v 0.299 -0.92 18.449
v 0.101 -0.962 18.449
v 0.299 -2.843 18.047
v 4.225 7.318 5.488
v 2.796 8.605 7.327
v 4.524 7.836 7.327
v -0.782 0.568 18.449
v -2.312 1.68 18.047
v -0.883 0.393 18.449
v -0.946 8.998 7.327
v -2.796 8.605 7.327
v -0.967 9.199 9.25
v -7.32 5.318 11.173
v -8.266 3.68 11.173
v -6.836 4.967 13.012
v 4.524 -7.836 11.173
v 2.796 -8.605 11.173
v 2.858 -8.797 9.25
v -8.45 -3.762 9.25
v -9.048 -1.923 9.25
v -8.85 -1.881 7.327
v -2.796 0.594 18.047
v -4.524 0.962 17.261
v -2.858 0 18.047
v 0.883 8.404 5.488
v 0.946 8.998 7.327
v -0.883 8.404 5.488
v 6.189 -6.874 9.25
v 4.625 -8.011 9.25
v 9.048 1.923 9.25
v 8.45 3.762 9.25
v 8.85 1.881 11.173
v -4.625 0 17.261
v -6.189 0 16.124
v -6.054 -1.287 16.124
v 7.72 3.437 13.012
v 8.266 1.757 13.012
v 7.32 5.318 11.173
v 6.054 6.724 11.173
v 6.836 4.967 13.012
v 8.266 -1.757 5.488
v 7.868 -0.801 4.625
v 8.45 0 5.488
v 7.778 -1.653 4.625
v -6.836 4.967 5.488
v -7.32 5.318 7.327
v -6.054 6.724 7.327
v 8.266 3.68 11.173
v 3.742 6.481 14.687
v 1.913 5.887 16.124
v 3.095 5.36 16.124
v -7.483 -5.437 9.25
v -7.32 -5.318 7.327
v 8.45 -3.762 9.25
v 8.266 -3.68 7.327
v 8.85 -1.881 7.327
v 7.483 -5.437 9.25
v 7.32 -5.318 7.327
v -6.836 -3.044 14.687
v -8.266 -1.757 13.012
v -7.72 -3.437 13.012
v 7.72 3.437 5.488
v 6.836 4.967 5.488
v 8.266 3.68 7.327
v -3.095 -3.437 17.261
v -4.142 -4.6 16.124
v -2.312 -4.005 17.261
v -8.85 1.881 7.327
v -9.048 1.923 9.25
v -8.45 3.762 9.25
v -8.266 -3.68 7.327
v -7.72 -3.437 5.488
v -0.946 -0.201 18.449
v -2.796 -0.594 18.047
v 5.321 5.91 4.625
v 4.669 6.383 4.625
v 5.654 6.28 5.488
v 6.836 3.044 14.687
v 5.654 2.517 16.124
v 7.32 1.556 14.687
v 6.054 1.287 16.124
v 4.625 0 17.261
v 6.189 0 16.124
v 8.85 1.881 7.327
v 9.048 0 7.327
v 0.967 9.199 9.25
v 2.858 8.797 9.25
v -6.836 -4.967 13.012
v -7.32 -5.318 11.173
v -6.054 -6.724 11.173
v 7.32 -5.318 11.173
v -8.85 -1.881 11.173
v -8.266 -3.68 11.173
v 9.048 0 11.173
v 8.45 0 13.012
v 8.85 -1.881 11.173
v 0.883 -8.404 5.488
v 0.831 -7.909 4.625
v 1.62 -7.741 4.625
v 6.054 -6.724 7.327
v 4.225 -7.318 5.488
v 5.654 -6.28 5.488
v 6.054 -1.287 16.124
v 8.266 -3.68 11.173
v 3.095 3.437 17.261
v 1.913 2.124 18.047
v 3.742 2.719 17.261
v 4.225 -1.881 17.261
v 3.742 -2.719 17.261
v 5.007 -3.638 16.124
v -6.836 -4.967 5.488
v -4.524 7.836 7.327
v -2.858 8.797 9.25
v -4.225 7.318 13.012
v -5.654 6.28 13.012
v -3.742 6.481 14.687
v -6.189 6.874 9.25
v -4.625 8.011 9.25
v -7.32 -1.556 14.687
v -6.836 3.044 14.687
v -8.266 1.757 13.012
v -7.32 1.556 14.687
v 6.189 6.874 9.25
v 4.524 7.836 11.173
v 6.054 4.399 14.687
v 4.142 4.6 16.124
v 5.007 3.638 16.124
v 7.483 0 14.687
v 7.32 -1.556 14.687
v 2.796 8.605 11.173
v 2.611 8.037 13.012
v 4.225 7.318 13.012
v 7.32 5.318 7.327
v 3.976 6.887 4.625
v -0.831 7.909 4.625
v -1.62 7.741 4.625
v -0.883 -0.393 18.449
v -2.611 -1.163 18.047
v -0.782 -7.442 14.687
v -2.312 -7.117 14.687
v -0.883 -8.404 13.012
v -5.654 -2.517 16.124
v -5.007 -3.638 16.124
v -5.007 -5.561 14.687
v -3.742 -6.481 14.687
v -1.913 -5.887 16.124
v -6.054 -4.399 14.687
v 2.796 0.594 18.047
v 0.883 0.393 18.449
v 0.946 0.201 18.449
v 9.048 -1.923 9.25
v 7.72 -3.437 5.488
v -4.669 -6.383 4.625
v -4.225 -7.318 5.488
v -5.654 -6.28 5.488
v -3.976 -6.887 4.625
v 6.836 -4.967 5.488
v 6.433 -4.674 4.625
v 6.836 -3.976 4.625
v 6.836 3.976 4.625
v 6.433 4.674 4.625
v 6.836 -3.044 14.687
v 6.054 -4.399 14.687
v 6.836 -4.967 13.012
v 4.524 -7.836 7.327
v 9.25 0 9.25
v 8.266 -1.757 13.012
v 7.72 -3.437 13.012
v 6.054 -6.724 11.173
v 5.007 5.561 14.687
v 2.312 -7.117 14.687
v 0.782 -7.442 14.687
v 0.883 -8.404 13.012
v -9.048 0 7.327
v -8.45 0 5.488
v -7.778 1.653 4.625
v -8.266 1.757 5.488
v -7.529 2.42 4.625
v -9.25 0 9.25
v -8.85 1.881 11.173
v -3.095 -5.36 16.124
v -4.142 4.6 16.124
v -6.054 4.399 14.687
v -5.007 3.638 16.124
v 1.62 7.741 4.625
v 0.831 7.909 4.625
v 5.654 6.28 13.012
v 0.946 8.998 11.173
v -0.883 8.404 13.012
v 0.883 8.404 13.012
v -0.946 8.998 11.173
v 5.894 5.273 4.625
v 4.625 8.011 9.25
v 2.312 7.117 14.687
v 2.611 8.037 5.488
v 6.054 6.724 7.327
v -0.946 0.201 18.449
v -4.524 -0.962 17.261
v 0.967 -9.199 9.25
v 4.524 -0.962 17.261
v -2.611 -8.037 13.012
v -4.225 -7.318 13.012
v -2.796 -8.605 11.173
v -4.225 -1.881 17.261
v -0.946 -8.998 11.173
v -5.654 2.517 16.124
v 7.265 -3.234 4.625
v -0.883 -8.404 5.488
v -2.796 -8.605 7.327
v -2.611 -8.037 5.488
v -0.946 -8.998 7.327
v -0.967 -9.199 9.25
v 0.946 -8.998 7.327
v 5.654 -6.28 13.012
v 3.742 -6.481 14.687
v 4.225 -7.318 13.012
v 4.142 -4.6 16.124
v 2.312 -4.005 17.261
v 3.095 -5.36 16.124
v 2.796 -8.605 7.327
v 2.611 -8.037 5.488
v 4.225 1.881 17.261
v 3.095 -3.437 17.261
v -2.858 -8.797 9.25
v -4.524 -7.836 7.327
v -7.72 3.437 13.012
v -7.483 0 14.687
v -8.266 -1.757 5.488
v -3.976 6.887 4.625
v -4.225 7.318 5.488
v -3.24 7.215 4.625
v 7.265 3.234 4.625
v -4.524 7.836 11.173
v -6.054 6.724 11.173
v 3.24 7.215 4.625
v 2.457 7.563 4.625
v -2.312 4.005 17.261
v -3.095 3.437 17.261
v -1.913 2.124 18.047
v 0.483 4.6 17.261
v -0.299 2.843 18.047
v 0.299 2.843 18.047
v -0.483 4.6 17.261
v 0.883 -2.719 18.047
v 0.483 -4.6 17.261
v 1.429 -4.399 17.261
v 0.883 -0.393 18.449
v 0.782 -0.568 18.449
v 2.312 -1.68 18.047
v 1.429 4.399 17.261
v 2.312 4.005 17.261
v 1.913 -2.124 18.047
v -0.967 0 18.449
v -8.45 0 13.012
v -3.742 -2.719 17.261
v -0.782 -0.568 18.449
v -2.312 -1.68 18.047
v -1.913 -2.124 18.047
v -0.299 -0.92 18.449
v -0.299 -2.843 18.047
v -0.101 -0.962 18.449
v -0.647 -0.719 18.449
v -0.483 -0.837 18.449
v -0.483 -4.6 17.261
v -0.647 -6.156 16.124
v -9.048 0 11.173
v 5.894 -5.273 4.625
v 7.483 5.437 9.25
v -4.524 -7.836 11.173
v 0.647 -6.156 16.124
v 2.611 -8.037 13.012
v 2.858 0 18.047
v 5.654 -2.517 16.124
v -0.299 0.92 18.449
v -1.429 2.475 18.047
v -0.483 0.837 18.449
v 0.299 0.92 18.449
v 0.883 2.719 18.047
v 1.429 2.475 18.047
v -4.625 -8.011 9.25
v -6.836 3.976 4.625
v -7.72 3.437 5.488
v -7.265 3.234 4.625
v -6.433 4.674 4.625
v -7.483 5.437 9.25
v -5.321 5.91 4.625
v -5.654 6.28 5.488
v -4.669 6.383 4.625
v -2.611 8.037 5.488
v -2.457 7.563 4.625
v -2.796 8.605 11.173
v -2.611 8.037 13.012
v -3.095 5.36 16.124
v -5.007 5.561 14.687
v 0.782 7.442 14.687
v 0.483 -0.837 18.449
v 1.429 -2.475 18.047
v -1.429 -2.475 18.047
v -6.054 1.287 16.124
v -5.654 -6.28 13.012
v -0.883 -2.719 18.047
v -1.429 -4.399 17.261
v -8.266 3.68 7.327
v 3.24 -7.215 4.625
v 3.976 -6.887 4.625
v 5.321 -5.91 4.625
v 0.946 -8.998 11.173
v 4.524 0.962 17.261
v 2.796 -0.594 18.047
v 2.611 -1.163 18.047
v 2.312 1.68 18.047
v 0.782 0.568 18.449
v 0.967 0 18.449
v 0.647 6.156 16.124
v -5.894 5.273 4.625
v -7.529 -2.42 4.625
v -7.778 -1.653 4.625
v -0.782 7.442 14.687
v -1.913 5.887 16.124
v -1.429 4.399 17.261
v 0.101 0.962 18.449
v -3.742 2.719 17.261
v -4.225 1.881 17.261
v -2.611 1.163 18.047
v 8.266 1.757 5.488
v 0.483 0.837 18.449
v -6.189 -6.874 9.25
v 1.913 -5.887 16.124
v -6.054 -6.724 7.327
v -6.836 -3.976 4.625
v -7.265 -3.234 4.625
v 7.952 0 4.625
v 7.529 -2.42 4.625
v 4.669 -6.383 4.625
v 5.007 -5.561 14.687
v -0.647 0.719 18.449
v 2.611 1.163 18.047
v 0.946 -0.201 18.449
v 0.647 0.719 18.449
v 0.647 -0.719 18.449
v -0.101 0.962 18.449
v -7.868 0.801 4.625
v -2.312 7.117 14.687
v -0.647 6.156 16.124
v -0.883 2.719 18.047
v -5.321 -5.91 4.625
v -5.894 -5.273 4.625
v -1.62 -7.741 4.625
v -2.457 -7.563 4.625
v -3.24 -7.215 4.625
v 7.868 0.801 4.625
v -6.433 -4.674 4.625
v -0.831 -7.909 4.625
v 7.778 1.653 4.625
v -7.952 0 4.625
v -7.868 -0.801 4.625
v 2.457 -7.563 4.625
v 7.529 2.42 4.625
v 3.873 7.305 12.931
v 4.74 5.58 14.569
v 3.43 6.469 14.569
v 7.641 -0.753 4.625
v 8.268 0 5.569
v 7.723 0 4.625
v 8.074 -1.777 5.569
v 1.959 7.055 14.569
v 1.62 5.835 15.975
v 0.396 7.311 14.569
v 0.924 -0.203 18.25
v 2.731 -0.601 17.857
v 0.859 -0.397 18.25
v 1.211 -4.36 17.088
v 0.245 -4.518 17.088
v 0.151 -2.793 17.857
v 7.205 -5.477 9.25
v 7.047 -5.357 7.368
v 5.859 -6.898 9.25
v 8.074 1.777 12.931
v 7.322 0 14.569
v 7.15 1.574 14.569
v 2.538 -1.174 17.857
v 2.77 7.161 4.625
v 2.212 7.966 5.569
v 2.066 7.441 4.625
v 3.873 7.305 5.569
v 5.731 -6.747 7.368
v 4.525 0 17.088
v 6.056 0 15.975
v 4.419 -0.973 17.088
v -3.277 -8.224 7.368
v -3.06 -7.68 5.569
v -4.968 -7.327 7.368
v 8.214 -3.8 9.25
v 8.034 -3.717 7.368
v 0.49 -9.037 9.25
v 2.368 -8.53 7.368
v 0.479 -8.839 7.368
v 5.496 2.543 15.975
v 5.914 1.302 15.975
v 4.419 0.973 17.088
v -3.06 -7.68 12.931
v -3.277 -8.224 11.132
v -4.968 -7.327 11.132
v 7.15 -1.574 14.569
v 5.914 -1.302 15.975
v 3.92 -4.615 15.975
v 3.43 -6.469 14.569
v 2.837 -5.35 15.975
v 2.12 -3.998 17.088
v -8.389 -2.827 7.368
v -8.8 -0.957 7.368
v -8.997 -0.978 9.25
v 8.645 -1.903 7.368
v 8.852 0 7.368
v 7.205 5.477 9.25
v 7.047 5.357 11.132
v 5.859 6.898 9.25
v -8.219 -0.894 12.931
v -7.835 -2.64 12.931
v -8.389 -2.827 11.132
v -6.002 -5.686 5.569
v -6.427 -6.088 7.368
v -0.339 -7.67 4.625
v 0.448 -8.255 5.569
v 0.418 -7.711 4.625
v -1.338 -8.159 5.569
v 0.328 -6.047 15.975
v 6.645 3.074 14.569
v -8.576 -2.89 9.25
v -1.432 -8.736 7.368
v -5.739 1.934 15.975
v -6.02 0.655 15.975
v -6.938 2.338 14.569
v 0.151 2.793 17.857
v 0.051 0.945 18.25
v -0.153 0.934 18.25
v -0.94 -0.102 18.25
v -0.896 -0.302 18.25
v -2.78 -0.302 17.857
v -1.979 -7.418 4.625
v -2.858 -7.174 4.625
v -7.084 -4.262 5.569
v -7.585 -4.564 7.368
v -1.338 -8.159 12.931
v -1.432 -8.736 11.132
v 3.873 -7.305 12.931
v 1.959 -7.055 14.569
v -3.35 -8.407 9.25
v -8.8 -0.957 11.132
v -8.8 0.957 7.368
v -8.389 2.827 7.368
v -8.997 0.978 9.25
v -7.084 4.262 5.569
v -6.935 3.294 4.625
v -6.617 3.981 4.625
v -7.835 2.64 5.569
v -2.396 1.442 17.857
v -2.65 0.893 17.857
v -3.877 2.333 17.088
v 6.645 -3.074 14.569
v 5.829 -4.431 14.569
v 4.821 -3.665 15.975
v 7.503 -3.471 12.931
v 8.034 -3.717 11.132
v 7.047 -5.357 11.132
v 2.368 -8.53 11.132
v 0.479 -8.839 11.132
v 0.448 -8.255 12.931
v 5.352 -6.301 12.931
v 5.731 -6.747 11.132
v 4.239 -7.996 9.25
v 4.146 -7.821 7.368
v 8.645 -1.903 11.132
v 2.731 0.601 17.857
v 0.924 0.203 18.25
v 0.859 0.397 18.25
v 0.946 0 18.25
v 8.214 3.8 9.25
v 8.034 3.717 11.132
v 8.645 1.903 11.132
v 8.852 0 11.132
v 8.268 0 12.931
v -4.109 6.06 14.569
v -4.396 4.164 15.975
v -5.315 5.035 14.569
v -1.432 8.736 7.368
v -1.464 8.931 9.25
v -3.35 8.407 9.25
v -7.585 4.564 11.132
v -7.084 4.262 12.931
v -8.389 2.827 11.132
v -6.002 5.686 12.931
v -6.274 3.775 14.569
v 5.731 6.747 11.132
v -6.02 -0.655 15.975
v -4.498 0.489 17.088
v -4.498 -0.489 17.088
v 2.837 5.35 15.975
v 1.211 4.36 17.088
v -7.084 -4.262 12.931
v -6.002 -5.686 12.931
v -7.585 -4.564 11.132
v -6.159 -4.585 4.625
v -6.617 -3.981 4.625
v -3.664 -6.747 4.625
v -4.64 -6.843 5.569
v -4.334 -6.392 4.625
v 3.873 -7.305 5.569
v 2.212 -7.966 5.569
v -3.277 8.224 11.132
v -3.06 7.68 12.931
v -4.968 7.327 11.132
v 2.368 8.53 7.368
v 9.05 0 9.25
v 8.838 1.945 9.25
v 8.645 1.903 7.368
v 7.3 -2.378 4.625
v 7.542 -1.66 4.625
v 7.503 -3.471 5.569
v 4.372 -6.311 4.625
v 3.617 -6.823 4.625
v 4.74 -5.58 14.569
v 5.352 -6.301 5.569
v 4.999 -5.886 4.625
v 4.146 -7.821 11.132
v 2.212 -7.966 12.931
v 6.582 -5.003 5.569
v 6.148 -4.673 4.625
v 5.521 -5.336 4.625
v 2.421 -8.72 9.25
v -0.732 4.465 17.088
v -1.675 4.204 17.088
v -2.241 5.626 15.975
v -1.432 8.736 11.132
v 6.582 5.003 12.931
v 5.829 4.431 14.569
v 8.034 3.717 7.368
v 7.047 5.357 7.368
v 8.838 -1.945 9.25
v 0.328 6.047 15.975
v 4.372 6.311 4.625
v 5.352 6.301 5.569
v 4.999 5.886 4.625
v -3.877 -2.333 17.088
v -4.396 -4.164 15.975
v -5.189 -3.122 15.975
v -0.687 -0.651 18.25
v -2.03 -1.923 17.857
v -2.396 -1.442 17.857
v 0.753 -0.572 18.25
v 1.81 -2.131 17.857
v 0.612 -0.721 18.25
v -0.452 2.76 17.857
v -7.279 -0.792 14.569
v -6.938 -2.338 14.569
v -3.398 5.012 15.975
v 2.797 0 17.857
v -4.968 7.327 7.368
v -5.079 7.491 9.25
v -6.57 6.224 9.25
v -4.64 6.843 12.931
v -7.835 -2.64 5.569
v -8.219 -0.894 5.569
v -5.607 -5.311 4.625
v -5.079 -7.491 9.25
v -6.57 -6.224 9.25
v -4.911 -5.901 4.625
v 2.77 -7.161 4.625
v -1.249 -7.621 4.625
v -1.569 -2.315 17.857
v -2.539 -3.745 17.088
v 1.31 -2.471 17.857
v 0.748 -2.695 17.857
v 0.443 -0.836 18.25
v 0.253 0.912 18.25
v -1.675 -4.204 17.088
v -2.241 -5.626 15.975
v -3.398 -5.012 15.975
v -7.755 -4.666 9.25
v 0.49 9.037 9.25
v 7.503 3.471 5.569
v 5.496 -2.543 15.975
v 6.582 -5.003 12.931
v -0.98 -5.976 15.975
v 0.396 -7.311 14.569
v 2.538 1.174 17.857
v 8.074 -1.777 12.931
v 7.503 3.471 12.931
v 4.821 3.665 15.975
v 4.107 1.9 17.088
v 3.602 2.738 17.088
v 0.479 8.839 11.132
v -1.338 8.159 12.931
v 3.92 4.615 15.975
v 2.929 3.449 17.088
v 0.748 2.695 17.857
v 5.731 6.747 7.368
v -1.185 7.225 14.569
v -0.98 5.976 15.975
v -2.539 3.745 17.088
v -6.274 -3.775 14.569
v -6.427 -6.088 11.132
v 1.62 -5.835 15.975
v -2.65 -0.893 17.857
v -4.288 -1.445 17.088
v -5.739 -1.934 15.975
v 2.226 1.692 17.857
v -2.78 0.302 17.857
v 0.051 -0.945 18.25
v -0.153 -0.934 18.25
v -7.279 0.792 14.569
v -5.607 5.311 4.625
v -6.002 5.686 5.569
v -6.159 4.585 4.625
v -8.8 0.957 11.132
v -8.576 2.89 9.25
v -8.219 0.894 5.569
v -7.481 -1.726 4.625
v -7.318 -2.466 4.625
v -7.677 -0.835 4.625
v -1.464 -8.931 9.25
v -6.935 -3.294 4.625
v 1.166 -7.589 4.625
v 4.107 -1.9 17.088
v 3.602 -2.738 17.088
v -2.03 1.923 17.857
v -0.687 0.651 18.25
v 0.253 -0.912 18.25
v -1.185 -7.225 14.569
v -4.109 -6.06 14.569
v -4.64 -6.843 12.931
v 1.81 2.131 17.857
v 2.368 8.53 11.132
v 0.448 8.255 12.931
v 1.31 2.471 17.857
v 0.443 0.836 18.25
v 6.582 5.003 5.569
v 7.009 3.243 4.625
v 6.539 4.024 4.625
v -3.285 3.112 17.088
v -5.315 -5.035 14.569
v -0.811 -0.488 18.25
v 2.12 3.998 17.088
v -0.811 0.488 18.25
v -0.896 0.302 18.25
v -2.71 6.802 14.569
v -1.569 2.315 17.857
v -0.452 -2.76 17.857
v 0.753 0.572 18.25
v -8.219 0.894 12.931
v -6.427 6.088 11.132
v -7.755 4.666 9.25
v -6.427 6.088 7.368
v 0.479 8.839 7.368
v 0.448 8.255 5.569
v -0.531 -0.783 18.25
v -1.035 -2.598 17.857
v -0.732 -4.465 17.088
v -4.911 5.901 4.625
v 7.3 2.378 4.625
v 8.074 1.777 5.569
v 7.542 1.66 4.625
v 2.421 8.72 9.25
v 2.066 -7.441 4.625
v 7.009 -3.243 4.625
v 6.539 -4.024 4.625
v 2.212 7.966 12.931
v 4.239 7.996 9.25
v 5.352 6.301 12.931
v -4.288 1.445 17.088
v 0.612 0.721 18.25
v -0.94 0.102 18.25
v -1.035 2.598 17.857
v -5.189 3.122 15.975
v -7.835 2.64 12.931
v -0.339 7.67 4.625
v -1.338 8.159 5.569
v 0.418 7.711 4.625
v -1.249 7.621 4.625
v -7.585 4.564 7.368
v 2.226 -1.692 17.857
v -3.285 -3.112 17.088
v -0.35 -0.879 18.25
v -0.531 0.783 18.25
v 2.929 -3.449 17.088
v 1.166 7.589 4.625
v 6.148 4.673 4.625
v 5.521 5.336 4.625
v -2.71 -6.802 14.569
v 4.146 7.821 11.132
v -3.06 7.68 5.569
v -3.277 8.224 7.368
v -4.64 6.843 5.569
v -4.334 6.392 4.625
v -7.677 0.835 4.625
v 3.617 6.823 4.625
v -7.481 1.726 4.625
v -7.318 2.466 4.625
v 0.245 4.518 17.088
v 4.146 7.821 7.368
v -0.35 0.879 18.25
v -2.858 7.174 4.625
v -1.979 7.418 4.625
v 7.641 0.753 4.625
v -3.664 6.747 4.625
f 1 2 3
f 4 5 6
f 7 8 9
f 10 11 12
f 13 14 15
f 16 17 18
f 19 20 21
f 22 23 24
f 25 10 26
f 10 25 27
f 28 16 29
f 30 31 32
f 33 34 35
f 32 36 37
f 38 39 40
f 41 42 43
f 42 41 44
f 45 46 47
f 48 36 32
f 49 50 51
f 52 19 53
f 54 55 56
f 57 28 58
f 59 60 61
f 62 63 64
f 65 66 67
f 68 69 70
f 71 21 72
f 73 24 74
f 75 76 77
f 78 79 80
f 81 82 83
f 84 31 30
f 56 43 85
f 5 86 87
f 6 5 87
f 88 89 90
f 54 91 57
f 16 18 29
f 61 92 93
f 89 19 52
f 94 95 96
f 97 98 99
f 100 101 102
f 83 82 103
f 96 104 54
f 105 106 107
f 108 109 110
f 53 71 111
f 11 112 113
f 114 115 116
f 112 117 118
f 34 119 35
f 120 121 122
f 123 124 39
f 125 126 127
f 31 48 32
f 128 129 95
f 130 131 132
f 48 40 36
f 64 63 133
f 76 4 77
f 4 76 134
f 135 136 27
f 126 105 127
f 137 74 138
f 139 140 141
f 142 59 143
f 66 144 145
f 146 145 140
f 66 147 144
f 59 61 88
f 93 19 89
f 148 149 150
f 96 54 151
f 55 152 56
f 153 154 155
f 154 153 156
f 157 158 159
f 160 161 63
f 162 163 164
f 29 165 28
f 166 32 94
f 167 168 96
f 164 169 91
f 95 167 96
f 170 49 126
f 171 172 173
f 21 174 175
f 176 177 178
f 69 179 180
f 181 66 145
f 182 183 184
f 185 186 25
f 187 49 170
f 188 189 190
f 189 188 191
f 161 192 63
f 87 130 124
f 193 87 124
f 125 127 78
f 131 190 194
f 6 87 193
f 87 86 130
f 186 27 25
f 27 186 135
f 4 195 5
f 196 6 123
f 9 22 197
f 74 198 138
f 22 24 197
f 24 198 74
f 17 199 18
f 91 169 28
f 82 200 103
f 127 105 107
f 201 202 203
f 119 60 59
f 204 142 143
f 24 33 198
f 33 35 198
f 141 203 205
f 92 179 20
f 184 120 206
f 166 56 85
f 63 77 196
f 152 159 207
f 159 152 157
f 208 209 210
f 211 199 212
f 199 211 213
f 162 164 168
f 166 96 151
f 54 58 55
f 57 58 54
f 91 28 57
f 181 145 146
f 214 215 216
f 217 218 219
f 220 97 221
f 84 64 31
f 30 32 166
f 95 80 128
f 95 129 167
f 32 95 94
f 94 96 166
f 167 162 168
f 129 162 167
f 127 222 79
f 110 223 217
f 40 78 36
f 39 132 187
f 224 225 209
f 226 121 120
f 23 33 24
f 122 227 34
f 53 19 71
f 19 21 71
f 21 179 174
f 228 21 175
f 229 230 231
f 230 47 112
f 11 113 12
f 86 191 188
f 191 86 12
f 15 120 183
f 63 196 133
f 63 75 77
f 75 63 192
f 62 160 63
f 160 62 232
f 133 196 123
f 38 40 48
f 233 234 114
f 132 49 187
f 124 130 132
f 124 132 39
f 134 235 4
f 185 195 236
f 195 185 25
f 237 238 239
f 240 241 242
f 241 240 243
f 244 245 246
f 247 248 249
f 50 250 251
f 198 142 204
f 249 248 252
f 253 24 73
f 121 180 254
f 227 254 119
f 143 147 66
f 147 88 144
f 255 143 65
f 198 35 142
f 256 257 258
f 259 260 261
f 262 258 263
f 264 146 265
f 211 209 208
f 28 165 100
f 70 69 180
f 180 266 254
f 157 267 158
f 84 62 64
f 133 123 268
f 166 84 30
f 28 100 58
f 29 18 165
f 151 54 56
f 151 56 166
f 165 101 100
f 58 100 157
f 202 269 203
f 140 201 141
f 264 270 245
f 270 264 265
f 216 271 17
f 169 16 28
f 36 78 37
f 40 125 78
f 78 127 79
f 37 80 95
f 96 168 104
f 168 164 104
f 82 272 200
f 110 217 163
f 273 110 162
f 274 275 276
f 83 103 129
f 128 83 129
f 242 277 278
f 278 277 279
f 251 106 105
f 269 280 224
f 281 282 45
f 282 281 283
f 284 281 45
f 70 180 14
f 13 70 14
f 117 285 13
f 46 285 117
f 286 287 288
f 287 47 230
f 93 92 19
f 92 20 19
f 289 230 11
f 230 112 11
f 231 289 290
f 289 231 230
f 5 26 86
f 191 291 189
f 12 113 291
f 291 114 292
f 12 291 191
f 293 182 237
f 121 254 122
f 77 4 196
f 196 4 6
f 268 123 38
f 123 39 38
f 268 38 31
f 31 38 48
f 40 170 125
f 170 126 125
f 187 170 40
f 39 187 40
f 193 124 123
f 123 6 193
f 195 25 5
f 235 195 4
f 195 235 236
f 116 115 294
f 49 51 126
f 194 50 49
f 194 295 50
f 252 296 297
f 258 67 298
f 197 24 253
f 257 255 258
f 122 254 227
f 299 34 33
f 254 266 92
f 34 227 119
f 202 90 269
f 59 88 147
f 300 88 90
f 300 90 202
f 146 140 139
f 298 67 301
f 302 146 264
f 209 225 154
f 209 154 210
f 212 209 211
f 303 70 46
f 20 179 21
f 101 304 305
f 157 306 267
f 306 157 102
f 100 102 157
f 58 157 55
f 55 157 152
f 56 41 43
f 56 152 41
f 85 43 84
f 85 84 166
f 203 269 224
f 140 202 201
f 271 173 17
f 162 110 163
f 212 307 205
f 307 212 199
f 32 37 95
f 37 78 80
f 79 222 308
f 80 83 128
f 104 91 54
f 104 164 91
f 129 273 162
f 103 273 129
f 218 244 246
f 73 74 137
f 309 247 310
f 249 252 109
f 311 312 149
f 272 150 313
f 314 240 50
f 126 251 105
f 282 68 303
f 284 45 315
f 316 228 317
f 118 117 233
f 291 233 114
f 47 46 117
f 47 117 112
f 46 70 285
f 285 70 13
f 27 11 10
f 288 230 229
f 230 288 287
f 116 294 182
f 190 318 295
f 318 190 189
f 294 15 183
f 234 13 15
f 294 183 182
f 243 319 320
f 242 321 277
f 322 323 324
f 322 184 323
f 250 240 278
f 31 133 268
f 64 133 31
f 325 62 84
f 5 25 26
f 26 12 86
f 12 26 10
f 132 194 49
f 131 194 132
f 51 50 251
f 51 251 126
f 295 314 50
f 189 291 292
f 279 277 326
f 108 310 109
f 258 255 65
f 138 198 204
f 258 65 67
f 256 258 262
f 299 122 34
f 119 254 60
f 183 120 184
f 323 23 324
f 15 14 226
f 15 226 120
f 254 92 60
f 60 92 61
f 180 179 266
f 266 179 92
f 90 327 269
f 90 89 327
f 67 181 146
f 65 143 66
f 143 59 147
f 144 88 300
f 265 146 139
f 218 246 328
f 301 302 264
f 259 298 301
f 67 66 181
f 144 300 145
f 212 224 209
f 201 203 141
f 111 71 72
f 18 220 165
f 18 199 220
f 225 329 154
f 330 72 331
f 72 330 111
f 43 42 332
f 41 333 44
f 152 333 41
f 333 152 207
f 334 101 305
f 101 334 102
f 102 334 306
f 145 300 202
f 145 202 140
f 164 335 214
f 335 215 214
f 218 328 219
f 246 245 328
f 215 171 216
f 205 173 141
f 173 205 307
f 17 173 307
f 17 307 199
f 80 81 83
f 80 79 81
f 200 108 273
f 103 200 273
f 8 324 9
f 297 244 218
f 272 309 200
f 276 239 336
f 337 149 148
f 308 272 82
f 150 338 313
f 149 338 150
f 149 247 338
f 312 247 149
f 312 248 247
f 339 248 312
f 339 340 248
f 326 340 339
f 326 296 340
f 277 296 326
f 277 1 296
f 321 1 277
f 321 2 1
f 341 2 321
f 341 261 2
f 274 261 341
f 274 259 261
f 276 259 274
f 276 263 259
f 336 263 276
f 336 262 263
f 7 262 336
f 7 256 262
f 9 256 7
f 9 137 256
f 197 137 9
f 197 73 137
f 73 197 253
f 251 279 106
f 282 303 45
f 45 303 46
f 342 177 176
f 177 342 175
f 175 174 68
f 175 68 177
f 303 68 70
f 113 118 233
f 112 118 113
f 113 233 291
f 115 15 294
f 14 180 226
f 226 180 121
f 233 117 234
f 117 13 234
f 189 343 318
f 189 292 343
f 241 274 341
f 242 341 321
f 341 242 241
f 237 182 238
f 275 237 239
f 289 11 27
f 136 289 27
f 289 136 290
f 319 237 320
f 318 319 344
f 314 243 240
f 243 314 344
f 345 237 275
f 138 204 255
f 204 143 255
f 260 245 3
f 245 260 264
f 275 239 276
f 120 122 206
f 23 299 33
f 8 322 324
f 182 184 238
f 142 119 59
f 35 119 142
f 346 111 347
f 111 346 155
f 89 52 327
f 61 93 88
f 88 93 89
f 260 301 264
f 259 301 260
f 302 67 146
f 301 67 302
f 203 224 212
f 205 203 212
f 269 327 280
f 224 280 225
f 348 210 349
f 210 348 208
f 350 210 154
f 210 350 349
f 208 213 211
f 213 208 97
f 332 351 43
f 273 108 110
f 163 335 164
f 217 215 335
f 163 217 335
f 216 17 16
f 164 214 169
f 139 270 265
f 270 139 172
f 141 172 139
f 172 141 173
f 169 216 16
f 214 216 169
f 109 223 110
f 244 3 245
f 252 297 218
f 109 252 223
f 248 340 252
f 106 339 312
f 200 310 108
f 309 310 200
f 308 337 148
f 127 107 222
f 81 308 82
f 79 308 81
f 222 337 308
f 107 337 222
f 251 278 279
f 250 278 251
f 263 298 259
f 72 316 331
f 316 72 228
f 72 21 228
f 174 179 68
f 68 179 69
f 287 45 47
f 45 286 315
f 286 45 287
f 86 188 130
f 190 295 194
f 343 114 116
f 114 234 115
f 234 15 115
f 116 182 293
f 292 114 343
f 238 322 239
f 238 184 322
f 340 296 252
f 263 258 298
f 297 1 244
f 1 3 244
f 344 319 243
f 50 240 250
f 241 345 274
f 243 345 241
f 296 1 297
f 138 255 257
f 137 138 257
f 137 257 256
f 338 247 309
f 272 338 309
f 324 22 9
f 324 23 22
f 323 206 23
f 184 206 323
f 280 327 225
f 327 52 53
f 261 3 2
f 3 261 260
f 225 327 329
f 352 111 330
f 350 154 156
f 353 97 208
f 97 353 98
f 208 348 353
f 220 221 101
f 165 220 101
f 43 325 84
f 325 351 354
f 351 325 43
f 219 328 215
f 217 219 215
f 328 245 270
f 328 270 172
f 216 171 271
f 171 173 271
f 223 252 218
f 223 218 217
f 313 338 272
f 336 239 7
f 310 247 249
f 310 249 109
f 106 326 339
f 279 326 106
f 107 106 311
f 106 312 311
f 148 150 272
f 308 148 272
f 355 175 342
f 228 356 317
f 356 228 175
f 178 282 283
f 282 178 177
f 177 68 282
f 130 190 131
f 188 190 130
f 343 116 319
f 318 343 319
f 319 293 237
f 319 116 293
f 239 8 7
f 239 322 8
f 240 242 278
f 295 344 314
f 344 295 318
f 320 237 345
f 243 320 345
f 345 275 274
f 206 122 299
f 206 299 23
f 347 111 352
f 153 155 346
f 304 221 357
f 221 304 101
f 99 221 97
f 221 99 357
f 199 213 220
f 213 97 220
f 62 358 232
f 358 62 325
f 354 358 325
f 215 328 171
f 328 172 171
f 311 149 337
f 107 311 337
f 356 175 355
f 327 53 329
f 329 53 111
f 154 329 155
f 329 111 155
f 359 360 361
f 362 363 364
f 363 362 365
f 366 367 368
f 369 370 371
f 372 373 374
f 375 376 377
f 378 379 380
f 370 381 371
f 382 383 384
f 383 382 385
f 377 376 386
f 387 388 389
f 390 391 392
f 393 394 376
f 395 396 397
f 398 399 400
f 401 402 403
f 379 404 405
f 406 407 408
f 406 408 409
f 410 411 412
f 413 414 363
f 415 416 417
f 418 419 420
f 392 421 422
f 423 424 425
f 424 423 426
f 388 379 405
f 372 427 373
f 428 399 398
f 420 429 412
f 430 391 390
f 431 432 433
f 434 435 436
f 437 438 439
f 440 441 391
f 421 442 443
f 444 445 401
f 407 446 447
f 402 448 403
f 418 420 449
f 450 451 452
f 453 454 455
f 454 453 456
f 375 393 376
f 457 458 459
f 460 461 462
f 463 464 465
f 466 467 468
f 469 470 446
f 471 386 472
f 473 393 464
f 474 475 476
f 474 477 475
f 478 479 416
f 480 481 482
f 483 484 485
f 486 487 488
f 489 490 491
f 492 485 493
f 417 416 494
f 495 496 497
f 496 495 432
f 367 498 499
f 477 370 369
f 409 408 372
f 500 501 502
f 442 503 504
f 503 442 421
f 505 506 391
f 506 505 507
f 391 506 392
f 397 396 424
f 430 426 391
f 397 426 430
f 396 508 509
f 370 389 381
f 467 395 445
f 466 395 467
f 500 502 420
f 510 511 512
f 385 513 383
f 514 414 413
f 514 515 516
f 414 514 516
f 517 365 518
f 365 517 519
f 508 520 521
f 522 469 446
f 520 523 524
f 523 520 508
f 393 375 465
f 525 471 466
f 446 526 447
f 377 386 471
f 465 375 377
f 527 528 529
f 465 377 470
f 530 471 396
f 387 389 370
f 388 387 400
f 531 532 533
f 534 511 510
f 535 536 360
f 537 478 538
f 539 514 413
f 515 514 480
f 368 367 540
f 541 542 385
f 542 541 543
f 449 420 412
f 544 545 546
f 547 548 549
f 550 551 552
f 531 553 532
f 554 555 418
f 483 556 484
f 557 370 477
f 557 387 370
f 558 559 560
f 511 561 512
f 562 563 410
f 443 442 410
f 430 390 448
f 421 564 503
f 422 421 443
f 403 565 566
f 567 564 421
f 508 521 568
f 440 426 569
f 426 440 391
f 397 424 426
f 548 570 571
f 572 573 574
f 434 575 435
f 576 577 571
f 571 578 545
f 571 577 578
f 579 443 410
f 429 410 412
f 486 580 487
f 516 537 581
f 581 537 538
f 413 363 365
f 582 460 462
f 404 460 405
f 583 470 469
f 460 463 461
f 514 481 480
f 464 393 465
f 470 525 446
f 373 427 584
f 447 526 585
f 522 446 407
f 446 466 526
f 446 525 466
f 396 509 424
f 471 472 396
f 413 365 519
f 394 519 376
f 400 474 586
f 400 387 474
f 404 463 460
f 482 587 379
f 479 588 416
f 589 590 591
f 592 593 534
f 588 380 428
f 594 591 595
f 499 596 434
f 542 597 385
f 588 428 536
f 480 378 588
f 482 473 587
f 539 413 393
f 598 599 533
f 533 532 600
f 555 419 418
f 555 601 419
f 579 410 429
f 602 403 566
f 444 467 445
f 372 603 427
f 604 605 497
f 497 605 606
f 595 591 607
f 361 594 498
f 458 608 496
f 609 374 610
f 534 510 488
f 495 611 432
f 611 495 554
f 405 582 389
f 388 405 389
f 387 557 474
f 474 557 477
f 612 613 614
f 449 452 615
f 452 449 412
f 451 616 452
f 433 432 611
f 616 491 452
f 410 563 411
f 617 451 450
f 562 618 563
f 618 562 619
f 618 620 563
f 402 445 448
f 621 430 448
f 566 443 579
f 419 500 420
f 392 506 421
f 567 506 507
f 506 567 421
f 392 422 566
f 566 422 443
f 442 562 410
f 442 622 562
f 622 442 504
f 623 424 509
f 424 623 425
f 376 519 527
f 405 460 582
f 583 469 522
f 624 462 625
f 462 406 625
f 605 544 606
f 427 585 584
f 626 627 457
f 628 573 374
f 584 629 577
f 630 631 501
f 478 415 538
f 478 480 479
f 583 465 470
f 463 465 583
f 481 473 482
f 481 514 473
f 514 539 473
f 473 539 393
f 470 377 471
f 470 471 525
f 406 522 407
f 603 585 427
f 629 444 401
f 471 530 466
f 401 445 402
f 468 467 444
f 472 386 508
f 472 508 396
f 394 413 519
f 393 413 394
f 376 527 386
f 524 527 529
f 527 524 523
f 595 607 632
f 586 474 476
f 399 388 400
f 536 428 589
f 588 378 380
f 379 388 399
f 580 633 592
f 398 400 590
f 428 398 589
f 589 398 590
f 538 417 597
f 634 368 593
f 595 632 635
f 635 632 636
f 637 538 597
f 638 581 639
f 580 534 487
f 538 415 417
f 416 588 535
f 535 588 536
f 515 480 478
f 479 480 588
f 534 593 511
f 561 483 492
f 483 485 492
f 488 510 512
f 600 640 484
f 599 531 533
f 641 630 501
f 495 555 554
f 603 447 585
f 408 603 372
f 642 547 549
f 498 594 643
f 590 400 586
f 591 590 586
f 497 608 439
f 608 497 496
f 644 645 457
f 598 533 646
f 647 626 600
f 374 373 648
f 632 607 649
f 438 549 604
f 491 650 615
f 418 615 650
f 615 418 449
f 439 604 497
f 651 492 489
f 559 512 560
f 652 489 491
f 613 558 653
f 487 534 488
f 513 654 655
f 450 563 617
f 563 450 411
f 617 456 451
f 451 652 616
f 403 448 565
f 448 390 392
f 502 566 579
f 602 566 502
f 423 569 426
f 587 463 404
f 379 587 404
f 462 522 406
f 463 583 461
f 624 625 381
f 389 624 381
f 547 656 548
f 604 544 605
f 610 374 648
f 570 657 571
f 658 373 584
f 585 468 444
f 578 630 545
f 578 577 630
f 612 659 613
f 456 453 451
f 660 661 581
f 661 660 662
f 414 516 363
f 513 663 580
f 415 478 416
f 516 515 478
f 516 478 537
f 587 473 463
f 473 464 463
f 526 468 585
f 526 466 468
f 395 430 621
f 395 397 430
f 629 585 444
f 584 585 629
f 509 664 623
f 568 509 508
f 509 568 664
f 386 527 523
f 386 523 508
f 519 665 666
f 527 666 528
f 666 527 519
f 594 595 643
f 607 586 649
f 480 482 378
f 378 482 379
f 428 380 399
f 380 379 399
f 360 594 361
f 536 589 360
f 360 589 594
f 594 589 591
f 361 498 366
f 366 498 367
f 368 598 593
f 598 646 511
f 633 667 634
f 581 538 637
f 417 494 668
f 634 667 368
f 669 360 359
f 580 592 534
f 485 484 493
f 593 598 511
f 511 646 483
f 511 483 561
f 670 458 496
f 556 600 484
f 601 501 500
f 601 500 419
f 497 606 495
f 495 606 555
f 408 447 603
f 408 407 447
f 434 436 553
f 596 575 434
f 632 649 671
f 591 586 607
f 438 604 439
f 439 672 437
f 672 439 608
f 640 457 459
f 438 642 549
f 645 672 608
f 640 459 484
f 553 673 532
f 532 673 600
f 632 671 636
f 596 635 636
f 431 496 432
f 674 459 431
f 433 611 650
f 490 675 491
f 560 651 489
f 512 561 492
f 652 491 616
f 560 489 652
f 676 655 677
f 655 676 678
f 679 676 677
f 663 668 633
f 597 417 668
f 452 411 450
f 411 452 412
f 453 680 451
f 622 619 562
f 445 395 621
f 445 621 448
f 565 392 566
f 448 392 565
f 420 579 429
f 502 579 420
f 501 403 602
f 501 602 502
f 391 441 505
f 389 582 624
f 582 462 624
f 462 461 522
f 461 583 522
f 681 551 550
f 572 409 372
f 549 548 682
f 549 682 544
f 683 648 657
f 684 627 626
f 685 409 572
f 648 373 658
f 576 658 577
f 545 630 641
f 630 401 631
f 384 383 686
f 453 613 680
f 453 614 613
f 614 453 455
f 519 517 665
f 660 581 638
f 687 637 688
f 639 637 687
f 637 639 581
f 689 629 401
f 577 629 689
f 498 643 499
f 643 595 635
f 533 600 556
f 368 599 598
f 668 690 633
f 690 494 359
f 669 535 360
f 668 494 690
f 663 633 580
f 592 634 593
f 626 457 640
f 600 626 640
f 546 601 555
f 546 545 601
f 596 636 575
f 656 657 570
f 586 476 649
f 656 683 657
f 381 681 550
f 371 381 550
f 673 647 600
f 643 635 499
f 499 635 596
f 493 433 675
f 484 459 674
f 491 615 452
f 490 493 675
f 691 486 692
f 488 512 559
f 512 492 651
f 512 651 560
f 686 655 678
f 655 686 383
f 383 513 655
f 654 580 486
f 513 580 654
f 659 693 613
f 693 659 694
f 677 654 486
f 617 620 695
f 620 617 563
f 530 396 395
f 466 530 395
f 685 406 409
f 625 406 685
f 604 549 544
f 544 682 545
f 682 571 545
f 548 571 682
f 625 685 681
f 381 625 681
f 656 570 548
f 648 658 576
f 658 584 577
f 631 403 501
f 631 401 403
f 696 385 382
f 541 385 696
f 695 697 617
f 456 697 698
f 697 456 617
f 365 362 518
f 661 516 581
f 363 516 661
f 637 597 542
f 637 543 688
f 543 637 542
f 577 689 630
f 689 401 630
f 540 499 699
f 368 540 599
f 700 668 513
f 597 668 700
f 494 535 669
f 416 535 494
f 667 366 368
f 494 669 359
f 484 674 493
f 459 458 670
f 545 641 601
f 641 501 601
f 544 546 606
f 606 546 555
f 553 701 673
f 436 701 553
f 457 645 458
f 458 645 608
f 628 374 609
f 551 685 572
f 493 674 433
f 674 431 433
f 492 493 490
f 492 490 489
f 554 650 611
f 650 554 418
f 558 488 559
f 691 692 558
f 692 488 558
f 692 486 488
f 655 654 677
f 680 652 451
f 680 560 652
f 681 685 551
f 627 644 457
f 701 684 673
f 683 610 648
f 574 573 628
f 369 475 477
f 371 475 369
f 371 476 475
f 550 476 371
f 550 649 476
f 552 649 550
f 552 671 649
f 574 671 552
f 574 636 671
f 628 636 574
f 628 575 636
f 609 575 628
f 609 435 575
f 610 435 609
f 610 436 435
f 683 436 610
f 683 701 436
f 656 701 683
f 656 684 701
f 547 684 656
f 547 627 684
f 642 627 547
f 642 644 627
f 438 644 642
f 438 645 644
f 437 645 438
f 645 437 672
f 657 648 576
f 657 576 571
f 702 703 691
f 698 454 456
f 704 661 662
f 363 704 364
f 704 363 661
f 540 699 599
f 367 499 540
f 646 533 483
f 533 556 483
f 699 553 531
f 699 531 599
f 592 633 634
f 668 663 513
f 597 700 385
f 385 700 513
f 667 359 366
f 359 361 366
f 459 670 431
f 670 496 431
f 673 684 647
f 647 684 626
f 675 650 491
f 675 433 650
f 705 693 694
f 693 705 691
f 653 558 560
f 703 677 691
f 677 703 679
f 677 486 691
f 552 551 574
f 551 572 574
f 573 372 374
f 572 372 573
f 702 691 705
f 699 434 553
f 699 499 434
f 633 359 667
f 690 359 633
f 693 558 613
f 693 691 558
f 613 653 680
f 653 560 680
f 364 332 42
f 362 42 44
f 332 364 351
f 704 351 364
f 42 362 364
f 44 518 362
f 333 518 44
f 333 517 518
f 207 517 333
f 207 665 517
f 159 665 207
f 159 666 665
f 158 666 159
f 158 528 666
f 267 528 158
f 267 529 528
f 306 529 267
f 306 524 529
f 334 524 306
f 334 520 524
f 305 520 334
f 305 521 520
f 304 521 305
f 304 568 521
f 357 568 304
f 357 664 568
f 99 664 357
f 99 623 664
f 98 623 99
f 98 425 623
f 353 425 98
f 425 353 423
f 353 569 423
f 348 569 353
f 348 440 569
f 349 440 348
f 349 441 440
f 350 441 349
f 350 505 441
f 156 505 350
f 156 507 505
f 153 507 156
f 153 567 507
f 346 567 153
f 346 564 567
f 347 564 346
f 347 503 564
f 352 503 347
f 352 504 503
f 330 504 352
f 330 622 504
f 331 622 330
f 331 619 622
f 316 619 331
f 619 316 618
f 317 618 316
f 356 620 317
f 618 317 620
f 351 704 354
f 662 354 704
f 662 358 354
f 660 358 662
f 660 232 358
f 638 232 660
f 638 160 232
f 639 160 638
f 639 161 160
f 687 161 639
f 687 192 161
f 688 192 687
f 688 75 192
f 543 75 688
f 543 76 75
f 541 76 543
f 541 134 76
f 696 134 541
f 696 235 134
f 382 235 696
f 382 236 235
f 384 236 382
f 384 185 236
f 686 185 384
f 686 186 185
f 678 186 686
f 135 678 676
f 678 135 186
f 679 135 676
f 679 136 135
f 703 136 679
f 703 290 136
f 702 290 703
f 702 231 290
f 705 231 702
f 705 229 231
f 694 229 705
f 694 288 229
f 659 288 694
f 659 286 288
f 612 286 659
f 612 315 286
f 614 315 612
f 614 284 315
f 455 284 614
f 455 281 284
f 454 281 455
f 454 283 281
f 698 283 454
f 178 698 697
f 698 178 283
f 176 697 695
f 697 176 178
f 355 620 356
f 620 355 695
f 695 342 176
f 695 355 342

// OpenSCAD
module hollow_sphere ()
{
    translate ([0, 0, 9.25]) {
        difference() {
        sphere(9.25);
        sphere(9.05);
        }
    }
}

difference() {
    hollow_sphere();
    cube([18.5, 18.5, 9.25], center = true);
}
//cube([18.5, 0.7, 9.25], center = true);
